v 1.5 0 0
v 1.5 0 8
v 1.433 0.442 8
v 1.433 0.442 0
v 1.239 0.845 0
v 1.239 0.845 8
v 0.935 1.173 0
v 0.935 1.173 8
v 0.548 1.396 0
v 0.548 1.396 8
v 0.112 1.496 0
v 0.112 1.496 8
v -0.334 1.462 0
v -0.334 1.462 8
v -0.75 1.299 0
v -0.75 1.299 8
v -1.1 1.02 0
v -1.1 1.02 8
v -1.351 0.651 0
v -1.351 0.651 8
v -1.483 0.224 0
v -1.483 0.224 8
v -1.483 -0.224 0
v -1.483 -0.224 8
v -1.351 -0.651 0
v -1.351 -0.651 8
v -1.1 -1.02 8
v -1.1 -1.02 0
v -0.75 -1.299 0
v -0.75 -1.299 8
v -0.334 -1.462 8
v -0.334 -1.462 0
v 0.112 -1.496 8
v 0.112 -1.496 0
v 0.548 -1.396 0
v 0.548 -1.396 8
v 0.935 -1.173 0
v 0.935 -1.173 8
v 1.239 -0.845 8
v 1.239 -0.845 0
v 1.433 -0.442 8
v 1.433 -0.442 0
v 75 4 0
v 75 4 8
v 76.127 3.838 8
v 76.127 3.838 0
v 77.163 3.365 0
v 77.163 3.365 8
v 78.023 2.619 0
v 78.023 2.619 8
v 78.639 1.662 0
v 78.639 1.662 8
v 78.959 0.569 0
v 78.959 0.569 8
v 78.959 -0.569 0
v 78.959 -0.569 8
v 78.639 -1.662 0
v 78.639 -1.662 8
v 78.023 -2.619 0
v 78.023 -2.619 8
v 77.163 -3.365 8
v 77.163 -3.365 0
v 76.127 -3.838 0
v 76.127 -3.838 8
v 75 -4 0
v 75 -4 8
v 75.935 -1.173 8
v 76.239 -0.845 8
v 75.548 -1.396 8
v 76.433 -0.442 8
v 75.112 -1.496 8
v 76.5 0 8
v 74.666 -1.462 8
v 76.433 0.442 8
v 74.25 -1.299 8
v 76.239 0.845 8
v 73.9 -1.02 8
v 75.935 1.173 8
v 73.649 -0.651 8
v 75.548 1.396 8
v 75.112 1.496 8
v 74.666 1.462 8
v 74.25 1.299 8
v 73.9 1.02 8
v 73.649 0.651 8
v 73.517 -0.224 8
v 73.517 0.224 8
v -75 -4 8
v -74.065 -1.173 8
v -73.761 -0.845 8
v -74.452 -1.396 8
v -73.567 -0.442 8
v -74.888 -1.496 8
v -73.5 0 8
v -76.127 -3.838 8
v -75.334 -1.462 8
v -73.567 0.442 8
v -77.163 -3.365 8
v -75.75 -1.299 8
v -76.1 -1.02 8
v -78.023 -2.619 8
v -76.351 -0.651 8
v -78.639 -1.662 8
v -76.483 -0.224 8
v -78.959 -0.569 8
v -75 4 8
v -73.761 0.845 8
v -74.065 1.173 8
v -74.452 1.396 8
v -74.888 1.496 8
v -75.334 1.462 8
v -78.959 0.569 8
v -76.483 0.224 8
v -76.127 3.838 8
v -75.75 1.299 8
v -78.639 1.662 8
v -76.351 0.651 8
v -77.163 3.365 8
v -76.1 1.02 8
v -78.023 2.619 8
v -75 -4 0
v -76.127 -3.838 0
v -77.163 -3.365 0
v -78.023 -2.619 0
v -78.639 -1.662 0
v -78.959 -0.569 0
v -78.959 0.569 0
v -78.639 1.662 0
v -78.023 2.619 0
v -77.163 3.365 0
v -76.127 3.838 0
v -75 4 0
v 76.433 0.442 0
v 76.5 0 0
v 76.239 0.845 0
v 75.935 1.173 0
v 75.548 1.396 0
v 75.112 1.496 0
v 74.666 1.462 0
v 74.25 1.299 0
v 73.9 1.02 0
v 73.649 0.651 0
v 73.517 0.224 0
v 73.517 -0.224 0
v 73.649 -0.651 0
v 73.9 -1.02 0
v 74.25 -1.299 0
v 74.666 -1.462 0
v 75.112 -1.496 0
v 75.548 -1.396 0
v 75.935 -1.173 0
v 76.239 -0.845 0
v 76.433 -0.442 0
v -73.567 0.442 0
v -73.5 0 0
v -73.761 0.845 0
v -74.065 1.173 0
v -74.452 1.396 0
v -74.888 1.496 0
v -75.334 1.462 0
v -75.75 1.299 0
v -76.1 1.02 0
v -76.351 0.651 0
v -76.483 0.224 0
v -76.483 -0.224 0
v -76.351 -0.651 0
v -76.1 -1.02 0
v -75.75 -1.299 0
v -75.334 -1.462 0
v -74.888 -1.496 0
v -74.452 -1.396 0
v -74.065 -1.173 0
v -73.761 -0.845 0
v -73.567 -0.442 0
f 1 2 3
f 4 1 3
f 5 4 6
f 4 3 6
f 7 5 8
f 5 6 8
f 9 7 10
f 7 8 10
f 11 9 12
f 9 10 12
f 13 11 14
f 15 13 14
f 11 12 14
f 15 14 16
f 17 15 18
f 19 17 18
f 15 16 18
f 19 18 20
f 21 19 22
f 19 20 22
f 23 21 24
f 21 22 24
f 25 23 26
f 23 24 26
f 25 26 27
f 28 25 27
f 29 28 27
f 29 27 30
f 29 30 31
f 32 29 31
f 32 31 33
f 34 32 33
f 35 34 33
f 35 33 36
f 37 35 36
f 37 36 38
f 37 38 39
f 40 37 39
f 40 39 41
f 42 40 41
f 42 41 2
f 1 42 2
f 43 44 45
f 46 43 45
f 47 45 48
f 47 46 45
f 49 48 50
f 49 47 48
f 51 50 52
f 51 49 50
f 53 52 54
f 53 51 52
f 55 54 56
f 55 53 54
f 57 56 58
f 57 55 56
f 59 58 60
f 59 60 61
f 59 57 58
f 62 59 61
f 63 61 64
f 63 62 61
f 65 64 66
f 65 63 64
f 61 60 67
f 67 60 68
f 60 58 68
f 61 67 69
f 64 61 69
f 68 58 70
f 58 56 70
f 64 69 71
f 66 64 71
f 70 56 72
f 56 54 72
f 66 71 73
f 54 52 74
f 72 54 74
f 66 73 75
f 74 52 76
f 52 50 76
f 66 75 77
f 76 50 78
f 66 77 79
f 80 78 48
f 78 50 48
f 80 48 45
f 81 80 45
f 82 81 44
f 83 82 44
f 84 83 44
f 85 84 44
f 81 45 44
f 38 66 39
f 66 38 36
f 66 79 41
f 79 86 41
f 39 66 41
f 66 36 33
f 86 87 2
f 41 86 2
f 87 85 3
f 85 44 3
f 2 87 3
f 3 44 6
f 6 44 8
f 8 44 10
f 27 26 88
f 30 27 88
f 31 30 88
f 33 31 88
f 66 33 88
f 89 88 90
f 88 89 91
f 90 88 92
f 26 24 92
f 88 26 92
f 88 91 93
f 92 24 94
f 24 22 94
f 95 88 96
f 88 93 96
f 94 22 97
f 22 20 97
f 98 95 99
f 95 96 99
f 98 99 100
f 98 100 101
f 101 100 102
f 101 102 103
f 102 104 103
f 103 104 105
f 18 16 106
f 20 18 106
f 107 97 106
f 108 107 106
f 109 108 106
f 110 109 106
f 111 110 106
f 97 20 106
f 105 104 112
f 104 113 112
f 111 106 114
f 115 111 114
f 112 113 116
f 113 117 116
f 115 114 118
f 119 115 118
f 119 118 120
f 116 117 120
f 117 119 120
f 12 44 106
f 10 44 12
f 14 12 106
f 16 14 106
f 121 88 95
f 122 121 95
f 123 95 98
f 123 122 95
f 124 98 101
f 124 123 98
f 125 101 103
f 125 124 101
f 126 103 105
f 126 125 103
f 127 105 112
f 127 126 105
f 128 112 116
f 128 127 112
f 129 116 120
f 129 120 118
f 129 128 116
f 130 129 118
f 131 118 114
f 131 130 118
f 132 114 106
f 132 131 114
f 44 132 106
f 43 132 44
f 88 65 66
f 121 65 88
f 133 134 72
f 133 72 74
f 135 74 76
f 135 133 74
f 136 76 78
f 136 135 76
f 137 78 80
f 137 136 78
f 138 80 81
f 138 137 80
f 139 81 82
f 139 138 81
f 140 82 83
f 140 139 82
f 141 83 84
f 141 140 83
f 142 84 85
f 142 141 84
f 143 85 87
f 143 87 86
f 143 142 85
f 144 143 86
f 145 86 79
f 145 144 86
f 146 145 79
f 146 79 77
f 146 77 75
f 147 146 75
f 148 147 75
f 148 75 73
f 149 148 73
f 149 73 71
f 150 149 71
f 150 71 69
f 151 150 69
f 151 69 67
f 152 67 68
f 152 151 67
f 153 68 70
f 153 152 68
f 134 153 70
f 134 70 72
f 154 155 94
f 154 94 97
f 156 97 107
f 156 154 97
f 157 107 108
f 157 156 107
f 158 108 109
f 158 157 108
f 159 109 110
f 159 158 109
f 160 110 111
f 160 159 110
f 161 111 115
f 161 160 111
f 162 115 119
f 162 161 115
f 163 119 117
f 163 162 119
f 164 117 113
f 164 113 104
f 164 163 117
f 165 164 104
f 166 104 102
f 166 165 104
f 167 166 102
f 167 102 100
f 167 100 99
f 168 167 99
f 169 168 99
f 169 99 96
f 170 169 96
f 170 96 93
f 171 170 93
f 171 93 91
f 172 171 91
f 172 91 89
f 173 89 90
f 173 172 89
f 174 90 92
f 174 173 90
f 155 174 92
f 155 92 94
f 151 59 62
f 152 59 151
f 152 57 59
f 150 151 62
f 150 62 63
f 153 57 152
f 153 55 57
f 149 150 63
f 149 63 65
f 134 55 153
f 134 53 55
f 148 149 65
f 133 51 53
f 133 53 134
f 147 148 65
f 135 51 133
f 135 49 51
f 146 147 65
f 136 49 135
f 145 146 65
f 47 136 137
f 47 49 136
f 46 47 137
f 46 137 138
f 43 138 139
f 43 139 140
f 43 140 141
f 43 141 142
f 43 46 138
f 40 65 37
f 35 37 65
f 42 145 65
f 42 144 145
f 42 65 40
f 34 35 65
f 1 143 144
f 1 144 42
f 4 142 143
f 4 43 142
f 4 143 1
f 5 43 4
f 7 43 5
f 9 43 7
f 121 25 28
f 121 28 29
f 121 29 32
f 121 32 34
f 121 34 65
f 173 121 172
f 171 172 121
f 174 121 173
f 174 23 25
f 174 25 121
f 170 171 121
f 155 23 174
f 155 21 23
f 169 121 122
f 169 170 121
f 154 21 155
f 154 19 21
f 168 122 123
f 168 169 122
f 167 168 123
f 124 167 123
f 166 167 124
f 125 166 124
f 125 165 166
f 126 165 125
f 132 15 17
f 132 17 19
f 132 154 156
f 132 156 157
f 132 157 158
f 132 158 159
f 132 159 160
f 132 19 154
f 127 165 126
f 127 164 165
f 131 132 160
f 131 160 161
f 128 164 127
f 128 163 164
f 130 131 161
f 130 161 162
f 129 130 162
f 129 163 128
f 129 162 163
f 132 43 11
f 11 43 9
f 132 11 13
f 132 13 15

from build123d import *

# Parameters (mm, degrees)
SKETCH1_R           = 1.5
BOSS_EXTRUDE1_DEPTH = 8
SKETCH2_R           = 1.5
CUT_EXTRUDE1_DEPTH  = 10


with BuildPart() as part:
    # Sketch1 → Boss-Extrude1 (new body)
    with BuildSketch(Plane.XY):
        with BuildLine():
            Line((75, -4), (-75, -4))
            ThreePointArc((-75, -4), (-79, 0), (-75, 4))
            Line((-75, 4), (75, 4))
            ThreePointArc((75, 4), (79, 0), (75, -4))
        make_face()
        with Locations((-75, 0)):
            Circle(SKETCH1_R, mode=Mode.SUBTRACT)
        with Locations((75, 0)):
            Circle(SKETCH1_R, mode=Mode.SUBTRACT)
    extrude(amount=BOSS_EXTRUDE1_DEPTH)

    # Sketch2 → Cut-Extrude1 (cut)
    with BuildSketch(Plane.XY.offset(8)):
        Circle(SKETCH2_R)
    extrude(amount=-CUT_EXTRUDE1_DEPTH, mode=Mode.SUBTRACT)


solid = part.part
